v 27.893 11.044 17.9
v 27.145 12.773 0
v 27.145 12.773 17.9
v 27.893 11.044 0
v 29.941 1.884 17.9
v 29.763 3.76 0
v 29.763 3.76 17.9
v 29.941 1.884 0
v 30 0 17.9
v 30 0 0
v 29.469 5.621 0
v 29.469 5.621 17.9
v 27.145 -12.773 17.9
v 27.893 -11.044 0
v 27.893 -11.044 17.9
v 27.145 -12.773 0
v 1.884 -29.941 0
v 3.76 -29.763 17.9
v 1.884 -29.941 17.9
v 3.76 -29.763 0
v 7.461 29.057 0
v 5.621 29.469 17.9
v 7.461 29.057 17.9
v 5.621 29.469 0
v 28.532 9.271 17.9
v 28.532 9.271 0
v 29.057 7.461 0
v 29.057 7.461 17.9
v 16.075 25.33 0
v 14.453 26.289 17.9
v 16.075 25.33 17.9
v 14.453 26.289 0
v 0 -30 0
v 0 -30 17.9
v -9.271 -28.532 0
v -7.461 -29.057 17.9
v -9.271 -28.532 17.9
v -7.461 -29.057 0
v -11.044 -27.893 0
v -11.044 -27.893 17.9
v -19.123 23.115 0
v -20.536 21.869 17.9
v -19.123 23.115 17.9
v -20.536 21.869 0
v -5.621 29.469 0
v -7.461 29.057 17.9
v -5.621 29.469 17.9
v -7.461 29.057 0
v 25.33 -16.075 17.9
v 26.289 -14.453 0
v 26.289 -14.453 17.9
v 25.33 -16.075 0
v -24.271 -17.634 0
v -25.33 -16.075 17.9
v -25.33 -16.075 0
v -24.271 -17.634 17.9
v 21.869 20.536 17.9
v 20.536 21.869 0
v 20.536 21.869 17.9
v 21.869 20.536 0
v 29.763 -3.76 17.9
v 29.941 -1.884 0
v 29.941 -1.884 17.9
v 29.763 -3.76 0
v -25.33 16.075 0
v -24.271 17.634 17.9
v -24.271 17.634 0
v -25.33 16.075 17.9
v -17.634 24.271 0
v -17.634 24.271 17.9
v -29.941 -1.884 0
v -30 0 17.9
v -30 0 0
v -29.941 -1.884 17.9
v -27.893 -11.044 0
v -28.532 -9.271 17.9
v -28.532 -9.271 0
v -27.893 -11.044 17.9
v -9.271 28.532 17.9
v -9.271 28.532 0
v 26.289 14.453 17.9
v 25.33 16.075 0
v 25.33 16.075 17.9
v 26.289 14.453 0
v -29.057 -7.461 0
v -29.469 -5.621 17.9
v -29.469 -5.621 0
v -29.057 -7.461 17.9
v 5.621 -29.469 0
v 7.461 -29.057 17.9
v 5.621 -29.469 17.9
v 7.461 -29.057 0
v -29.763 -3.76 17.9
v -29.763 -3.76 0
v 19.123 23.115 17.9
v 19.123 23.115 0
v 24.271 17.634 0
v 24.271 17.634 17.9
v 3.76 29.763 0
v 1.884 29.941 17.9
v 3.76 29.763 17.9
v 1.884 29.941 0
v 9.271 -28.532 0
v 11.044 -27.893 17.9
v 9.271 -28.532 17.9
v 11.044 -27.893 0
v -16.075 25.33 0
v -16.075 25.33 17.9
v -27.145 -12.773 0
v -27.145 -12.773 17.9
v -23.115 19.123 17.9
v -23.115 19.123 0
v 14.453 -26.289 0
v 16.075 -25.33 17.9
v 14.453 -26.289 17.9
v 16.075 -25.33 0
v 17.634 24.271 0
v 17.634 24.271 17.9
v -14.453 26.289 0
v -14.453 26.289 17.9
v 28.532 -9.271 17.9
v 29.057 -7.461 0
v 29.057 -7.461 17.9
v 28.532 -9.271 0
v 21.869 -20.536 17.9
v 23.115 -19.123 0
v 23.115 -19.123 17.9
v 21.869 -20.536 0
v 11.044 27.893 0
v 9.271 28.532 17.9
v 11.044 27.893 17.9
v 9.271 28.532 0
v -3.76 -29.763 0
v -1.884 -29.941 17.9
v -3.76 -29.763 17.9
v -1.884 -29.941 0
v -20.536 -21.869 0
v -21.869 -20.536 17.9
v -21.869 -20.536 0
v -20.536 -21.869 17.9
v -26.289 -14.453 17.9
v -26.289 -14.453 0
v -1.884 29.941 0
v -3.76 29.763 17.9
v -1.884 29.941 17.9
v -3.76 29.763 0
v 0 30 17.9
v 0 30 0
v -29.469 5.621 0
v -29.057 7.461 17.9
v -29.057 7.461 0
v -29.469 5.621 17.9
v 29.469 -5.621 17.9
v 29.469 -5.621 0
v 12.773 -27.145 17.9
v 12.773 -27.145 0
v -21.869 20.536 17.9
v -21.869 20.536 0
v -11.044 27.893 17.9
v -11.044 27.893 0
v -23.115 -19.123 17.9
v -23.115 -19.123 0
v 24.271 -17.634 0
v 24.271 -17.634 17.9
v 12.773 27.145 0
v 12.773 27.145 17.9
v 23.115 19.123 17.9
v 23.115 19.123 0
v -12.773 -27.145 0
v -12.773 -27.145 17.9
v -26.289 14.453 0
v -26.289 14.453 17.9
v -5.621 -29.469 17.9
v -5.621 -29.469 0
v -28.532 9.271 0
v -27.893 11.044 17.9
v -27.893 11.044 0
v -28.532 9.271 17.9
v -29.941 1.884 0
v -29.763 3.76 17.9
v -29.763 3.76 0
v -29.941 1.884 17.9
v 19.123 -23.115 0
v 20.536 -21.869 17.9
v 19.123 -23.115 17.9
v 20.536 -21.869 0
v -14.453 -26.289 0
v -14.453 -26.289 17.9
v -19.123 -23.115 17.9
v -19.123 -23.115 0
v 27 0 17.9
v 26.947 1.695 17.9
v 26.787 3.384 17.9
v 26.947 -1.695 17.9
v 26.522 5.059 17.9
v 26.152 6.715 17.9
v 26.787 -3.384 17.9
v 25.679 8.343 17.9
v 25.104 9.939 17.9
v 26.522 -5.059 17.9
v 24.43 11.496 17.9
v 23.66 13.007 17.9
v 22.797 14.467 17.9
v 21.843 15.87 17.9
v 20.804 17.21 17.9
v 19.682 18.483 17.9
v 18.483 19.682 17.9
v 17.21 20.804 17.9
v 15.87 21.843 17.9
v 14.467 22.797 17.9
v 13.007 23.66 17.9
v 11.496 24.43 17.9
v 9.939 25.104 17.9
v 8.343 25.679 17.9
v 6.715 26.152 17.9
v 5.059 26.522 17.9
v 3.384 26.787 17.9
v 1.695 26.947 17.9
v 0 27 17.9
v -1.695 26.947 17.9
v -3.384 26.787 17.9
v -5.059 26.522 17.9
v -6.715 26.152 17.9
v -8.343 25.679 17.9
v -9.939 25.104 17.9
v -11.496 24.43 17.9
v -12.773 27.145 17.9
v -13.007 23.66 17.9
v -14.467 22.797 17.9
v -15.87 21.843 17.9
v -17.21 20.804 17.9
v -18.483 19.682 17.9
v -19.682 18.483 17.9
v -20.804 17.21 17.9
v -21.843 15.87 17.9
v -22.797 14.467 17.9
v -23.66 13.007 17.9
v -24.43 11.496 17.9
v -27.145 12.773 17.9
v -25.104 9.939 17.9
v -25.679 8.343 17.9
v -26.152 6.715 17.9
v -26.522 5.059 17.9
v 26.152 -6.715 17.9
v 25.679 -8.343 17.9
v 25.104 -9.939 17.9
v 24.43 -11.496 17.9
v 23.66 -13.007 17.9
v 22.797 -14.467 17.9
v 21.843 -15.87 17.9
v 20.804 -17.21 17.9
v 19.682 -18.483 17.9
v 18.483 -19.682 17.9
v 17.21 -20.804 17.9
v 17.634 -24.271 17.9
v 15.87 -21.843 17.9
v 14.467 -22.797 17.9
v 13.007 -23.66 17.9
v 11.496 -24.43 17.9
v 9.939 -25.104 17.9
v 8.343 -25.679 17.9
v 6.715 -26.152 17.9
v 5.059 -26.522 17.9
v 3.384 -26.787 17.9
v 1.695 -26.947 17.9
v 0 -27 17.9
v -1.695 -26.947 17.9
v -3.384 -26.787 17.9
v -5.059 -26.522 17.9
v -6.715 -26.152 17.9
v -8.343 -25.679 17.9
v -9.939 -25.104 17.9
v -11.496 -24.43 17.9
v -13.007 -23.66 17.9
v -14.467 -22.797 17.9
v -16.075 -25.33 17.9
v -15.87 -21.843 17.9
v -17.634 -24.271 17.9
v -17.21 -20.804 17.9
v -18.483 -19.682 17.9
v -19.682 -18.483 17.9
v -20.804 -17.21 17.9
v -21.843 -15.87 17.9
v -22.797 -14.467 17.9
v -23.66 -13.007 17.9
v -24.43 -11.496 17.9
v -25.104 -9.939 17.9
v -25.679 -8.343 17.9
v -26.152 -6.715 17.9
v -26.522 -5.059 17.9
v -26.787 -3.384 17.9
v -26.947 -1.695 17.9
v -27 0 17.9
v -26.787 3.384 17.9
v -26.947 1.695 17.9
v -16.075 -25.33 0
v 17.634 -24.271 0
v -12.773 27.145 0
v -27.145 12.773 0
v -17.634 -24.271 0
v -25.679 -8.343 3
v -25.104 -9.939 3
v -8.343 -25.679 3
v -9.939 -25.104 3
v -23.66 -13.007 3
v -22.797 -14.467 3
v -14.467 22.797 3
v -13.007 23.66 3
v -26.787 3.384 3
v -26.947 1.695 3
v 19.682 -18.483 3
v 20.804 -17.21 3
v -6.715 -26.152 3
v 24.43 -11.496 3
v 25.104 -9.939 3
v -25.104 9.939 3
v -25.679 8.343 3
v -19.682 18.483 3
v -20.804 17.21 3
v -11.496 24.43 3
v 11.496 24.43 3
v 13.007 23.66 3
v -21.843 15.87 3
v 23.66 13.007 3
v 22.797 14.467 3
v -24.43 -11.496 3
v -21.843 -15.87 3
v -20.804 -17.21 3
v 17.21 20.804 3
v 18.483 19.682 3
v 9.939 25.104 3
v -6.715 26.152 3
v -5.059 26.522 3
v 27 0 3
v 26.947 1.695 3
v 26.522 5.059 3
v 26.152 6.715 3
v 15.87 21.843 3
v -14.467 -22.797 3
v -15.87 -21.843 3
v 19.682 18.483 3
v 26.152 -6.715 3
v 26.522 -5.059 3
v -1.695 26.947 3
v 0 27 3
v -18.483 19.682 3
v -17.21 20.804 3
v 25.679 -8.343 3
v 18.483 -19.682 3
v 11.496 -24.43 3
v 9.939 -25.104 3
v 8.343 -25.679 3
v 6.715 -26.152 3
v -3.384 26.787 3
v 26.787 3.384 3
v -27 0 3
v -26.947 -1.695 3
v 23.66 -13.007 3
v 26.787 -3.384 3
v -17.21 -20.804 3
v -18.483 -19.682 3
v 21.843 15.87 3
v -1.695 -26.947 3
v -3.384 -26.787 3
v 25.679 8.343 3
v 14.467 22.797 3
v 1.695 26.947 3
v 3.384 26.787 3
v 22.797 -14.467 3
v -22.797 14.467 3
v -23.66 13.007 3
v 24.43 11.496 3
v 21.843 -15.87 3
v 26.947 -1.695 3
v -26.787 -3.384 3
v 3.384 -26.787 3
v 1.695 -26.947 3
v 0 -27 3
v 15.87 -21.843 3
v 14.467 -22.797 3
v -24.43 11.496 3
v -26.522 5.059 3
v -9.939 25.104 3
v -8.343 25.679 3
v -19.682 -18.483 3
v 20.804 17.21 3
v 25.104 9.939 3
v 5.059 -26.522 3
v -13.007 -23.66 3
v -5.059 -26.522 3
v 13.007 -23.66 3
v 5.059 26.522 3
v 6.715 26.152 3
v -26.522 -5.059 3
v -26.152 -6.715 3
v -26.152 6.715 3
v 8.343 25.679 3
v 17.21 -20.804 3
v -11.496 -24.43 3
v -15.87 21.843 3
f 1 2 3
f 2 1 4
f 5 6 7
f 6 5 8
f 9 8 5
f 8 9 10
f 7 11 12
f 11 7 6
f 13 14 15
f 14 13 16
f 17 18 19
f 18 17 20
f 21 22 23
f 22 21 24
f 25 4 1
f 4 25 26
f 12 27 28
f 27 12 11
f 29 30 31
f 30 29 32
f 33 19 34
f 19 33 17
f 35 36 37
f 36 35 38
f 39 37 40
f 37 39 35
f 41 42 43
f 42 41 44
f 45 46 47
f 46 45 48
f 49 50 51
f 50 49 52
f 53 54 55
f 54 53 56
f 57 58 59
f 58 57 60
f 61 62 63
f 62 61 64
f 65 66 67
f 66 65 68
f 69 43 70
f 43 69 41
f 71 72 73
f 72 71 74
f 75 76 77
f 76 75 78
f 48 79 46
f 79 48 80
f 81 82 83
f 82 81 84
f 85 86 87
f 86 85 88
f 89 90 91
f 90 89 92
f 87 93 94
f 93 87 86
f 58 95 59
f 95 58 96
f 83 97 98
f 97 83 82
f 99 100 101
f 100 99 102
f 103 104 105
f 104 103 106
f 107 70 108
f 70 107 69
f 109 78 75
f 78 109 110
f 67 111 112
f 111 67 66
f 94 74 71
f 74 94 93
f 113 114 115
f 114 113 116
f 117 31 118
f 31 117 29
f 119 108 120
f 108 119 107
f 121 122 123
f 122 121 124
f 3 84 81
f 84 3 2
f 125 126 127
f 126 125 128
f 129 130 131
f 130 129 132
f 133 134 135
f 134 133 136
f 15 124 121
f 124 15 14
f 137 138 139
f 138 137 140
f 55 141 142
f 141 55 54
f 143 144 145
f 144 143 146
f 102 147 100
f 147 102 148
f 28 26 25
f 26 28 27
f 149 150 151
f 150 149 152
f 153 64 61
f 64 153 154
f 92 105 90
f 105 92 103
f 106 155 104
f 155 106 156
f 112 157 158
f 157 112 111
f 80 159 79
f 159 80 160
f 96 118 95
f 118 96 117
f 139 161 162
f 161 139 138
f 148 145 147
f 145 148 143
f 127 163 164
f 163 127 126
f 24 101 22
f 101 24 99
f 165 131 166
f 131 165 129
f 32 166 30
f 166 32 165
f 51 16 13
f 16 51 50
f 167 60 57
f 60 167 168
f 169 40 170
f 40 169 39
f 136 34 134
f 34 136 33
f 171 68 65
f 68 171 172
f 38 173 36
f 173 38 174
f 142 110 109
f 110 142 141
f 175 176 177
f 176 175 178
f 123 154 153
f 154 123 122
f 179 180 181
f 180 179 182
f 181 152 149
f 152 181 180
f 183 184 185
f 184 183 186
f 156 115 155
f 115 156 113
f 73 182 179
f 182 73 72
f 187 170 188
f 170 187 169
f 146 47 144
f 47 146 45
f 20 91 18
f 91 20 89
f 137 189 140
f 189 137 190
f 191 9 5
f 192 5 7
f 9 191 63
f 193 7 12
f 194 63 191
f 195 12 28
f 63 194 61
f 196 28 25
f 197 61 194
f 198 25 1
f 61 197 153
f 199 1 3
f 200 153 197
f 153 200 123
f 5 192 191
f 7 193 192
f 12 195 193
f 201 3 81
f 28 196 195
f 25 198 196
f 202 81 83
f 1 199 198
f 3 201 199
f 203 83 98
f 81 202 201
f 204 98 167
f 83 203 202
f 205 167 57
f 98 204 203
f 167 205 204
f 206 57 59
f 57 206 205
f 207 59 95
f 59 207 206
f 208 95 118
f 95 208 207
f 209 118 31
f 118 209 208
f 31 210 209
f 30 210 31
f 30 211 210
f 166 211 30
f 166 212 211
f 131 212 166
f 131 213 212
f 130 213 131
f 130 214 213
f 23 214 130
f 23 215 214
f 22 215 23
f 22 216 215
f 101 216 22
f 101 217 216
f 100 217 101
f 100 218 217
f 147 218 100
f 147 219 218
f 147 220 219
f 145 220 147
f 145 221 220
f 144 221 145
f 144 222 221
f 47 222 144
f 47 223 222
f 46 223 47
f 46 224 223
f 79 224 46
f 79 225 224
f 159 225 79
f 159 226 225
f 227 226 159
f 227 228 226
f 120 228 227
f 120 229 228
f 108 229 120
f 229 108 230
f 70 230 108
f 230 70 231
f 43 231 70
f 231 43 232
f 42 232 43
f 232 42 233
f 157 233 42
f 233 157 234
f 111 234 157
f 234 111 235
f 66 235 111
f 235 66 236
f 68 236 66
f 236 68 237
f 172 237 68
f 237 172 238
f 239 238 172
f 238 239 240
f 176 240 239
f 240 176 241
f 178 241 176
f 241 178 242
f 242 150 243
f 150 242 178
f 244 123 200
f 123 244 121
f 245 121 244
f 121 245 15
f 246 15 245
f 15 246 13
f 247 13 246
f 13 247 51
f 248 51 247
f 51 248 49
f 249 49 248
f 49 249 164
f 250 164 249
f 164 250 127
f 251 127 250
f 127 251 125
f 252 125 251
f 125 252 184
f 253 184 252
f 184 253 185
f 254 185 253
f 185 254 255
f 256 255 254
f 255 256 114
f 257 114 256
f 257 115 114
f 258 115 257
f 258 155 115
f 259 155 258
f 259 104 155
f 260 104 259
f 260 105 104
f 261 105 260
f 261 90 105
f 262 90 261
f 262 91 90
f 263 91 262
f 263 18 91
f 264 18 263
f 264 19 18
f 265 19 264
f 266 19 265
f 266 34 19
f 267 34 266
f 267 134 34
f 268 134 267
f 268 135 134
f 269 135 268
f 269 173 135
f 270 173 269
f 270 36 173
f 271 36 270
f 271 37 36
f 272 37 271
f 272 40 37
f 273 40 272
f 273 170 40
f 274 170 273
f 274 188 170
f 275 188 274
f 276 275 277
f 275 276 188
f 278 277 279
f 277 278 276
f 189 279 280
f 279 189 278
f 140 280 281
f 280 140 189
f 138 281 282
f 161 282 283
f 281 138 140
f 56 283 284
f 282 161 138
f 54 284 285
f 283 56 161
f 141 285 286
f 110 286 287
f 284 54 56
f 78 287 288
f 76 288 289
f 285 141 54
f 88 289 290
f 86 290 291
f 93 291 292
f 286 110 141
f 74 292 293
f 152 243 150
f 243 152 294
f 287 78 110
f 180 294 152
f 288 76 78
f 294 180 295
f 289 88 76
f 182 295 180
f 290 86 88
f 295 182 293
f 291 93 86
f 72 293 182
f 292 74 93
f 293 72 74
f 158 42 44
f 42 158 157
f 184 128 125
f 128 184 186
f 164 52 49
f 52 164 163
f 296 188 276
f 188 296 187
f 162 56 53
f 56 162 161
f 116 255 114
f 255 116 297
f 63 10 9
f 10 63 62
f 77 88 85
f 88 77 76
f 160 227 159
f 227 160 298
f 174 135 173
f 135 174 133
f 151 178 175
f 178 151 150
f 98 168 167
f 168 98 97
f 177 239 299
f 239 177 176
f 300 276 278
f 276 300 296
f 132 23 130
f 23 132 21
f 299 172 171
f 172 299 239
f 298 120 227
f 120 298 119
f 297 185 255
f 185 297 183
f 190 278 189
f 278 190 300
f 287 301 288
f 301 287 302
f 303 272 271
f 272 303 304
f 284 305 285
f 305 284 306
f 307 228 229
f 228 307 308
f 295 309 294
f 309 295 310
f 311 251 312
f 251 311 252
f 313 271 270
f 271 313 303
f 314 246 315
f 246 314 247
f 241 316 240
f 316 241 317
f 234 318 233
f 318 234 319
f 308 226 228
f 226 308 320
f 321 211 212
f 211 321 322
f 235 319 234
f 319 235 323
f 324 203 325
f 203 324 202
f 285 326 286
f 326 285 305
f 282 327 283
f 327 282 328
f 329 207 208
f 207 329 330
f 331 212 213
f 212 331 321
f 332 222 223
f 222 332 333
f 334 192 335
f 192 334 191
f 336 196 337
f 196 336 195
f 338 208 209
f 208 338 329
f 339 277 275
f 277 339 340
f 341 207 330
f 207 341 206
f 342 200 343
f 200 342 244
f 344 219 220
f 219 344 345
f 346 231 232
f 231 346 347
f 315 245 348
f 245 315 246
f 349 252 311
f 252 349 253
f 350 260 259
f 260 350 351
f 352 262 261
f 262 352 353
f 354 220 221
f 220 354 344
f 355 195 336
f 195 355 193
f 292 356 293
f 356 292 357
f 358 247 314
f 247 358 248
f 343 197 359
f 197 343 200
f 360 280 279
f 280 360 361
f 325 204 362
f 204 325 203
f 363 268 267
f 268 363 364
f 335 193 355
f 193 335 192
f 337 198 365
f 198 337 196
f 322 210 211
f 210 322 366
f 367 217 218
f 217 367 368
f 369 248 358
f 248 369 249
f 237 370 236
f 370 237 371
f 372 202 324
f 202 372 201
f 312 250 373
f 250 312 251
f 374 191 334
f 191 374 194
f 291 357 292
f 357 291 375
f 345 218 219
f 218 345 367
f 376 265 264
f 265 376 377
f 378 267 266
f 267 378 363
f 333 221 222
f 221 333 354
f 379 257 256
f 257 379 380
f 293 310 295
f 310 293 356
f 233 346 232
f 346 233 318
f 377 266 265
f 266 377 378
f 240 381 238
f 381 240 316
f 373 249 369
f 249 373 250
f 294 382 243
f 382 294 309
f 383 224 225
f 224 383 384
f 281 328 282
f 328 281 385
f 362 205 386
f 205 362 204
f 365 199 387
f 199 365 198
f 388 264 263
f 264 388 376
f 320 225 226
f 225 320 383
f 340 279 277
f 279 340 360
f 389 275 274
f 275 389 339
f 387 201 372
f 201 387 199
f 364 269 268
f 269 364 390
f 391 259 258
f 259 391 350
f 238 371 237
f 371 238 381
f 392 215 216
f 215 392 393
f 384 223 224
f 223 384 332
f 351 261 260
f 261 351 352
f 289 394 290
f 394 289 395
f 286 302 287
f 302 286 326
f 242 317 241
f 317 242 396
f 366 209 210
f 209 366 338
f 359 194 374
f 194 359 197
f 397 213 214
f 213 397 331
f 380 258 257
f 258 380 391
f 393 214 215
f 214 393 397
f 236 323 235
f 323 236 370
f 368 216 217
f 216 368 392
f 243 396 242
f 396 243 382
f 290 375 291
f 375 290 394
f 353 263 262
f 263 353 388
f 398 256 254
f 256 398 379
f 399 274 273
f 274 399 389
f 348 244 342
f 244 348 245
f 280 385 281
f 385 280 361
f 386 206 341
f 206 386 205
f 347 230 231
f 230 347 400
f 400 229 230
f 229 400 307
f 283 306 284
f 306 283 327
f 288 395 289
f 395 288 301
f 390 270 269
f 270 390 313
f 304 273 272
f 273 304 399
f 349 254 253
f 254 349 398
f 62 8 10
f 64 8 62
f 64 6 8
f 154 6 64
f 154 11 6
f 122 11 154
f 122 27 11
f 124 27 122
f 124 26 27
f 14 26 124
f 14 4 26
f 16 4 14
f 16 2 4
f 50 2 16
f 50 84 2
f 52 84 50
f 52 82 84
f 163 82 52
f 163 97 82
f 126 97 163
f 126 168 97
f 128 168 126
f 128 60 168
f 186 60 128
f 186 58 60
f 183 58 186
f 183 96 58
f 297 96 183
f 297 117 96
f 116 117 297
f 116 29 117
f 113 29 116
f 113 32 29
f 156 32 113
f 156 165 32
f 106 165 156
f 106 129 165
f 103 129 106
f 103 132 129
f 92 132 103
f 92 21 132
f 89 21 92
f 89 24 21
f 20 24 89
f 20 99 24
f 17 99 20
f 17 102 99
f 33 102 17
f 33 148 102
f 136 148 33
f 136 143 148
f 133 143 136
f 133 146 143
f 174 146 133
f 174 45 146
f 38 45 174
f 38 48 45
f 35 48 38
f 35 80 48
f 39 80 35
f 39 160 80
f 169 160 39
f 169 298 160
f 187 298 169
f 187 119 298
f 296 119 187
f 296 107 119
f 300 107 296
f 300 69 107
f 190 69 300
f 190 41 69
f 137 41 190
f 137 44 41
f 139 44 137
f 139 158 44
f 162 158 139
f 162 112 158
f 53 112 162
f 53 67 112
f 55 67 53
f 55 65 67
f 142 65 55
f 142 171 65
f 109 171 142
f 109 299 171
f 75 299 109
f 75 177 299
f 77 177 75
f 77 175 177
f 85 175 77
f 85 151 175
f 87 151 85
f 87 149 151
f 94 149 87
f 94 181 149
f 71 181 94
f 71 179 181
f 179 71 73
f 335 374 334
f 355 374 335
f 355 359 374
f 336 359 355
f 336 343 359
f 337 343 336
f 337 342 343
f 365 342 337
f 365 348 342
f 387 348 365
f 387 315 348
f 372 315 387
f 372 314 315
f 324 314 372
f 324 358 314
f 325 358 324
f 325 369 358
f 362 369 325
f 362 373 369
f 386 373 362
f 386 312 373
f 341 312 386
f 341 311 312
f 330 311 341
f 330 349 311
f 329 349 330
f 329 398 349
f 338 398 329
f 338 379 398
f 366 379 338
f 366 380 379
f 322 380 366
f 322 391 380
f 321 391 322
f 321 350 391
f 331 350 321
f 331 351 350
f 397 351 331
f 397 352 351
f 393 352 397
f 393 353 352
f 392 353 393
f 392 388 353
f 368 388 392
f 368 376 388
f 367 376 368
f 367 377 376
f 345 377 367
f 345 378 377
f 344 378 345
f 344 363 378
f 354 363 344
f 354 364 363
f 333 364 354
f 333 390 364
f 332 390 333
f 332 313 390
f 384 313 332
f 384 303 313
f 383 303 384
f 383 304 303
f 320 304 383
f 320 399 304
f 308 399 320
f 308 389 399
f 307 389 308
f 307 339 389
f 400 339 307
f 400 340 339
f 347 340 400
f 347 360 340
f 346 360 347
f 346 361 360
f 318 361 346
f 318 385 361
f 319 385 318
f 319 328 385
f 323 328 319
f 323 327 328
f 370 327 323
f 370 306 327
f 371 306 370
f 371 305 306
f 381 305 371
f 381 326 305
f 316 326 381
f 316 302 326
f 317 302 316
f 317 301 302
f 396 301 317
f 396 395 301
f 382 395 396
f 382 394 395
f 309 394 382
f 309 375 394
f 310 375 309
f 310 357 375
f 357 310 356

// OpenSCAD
union() {
    cylinder(h=3, r=30, center=false, $fn=100);

    translate([0,0,2.9])
        difference()    {
            cylinder(h=15, r=30, $fn=100);
            cylinder(h=16, r=27, $fn=100);
        }
}
